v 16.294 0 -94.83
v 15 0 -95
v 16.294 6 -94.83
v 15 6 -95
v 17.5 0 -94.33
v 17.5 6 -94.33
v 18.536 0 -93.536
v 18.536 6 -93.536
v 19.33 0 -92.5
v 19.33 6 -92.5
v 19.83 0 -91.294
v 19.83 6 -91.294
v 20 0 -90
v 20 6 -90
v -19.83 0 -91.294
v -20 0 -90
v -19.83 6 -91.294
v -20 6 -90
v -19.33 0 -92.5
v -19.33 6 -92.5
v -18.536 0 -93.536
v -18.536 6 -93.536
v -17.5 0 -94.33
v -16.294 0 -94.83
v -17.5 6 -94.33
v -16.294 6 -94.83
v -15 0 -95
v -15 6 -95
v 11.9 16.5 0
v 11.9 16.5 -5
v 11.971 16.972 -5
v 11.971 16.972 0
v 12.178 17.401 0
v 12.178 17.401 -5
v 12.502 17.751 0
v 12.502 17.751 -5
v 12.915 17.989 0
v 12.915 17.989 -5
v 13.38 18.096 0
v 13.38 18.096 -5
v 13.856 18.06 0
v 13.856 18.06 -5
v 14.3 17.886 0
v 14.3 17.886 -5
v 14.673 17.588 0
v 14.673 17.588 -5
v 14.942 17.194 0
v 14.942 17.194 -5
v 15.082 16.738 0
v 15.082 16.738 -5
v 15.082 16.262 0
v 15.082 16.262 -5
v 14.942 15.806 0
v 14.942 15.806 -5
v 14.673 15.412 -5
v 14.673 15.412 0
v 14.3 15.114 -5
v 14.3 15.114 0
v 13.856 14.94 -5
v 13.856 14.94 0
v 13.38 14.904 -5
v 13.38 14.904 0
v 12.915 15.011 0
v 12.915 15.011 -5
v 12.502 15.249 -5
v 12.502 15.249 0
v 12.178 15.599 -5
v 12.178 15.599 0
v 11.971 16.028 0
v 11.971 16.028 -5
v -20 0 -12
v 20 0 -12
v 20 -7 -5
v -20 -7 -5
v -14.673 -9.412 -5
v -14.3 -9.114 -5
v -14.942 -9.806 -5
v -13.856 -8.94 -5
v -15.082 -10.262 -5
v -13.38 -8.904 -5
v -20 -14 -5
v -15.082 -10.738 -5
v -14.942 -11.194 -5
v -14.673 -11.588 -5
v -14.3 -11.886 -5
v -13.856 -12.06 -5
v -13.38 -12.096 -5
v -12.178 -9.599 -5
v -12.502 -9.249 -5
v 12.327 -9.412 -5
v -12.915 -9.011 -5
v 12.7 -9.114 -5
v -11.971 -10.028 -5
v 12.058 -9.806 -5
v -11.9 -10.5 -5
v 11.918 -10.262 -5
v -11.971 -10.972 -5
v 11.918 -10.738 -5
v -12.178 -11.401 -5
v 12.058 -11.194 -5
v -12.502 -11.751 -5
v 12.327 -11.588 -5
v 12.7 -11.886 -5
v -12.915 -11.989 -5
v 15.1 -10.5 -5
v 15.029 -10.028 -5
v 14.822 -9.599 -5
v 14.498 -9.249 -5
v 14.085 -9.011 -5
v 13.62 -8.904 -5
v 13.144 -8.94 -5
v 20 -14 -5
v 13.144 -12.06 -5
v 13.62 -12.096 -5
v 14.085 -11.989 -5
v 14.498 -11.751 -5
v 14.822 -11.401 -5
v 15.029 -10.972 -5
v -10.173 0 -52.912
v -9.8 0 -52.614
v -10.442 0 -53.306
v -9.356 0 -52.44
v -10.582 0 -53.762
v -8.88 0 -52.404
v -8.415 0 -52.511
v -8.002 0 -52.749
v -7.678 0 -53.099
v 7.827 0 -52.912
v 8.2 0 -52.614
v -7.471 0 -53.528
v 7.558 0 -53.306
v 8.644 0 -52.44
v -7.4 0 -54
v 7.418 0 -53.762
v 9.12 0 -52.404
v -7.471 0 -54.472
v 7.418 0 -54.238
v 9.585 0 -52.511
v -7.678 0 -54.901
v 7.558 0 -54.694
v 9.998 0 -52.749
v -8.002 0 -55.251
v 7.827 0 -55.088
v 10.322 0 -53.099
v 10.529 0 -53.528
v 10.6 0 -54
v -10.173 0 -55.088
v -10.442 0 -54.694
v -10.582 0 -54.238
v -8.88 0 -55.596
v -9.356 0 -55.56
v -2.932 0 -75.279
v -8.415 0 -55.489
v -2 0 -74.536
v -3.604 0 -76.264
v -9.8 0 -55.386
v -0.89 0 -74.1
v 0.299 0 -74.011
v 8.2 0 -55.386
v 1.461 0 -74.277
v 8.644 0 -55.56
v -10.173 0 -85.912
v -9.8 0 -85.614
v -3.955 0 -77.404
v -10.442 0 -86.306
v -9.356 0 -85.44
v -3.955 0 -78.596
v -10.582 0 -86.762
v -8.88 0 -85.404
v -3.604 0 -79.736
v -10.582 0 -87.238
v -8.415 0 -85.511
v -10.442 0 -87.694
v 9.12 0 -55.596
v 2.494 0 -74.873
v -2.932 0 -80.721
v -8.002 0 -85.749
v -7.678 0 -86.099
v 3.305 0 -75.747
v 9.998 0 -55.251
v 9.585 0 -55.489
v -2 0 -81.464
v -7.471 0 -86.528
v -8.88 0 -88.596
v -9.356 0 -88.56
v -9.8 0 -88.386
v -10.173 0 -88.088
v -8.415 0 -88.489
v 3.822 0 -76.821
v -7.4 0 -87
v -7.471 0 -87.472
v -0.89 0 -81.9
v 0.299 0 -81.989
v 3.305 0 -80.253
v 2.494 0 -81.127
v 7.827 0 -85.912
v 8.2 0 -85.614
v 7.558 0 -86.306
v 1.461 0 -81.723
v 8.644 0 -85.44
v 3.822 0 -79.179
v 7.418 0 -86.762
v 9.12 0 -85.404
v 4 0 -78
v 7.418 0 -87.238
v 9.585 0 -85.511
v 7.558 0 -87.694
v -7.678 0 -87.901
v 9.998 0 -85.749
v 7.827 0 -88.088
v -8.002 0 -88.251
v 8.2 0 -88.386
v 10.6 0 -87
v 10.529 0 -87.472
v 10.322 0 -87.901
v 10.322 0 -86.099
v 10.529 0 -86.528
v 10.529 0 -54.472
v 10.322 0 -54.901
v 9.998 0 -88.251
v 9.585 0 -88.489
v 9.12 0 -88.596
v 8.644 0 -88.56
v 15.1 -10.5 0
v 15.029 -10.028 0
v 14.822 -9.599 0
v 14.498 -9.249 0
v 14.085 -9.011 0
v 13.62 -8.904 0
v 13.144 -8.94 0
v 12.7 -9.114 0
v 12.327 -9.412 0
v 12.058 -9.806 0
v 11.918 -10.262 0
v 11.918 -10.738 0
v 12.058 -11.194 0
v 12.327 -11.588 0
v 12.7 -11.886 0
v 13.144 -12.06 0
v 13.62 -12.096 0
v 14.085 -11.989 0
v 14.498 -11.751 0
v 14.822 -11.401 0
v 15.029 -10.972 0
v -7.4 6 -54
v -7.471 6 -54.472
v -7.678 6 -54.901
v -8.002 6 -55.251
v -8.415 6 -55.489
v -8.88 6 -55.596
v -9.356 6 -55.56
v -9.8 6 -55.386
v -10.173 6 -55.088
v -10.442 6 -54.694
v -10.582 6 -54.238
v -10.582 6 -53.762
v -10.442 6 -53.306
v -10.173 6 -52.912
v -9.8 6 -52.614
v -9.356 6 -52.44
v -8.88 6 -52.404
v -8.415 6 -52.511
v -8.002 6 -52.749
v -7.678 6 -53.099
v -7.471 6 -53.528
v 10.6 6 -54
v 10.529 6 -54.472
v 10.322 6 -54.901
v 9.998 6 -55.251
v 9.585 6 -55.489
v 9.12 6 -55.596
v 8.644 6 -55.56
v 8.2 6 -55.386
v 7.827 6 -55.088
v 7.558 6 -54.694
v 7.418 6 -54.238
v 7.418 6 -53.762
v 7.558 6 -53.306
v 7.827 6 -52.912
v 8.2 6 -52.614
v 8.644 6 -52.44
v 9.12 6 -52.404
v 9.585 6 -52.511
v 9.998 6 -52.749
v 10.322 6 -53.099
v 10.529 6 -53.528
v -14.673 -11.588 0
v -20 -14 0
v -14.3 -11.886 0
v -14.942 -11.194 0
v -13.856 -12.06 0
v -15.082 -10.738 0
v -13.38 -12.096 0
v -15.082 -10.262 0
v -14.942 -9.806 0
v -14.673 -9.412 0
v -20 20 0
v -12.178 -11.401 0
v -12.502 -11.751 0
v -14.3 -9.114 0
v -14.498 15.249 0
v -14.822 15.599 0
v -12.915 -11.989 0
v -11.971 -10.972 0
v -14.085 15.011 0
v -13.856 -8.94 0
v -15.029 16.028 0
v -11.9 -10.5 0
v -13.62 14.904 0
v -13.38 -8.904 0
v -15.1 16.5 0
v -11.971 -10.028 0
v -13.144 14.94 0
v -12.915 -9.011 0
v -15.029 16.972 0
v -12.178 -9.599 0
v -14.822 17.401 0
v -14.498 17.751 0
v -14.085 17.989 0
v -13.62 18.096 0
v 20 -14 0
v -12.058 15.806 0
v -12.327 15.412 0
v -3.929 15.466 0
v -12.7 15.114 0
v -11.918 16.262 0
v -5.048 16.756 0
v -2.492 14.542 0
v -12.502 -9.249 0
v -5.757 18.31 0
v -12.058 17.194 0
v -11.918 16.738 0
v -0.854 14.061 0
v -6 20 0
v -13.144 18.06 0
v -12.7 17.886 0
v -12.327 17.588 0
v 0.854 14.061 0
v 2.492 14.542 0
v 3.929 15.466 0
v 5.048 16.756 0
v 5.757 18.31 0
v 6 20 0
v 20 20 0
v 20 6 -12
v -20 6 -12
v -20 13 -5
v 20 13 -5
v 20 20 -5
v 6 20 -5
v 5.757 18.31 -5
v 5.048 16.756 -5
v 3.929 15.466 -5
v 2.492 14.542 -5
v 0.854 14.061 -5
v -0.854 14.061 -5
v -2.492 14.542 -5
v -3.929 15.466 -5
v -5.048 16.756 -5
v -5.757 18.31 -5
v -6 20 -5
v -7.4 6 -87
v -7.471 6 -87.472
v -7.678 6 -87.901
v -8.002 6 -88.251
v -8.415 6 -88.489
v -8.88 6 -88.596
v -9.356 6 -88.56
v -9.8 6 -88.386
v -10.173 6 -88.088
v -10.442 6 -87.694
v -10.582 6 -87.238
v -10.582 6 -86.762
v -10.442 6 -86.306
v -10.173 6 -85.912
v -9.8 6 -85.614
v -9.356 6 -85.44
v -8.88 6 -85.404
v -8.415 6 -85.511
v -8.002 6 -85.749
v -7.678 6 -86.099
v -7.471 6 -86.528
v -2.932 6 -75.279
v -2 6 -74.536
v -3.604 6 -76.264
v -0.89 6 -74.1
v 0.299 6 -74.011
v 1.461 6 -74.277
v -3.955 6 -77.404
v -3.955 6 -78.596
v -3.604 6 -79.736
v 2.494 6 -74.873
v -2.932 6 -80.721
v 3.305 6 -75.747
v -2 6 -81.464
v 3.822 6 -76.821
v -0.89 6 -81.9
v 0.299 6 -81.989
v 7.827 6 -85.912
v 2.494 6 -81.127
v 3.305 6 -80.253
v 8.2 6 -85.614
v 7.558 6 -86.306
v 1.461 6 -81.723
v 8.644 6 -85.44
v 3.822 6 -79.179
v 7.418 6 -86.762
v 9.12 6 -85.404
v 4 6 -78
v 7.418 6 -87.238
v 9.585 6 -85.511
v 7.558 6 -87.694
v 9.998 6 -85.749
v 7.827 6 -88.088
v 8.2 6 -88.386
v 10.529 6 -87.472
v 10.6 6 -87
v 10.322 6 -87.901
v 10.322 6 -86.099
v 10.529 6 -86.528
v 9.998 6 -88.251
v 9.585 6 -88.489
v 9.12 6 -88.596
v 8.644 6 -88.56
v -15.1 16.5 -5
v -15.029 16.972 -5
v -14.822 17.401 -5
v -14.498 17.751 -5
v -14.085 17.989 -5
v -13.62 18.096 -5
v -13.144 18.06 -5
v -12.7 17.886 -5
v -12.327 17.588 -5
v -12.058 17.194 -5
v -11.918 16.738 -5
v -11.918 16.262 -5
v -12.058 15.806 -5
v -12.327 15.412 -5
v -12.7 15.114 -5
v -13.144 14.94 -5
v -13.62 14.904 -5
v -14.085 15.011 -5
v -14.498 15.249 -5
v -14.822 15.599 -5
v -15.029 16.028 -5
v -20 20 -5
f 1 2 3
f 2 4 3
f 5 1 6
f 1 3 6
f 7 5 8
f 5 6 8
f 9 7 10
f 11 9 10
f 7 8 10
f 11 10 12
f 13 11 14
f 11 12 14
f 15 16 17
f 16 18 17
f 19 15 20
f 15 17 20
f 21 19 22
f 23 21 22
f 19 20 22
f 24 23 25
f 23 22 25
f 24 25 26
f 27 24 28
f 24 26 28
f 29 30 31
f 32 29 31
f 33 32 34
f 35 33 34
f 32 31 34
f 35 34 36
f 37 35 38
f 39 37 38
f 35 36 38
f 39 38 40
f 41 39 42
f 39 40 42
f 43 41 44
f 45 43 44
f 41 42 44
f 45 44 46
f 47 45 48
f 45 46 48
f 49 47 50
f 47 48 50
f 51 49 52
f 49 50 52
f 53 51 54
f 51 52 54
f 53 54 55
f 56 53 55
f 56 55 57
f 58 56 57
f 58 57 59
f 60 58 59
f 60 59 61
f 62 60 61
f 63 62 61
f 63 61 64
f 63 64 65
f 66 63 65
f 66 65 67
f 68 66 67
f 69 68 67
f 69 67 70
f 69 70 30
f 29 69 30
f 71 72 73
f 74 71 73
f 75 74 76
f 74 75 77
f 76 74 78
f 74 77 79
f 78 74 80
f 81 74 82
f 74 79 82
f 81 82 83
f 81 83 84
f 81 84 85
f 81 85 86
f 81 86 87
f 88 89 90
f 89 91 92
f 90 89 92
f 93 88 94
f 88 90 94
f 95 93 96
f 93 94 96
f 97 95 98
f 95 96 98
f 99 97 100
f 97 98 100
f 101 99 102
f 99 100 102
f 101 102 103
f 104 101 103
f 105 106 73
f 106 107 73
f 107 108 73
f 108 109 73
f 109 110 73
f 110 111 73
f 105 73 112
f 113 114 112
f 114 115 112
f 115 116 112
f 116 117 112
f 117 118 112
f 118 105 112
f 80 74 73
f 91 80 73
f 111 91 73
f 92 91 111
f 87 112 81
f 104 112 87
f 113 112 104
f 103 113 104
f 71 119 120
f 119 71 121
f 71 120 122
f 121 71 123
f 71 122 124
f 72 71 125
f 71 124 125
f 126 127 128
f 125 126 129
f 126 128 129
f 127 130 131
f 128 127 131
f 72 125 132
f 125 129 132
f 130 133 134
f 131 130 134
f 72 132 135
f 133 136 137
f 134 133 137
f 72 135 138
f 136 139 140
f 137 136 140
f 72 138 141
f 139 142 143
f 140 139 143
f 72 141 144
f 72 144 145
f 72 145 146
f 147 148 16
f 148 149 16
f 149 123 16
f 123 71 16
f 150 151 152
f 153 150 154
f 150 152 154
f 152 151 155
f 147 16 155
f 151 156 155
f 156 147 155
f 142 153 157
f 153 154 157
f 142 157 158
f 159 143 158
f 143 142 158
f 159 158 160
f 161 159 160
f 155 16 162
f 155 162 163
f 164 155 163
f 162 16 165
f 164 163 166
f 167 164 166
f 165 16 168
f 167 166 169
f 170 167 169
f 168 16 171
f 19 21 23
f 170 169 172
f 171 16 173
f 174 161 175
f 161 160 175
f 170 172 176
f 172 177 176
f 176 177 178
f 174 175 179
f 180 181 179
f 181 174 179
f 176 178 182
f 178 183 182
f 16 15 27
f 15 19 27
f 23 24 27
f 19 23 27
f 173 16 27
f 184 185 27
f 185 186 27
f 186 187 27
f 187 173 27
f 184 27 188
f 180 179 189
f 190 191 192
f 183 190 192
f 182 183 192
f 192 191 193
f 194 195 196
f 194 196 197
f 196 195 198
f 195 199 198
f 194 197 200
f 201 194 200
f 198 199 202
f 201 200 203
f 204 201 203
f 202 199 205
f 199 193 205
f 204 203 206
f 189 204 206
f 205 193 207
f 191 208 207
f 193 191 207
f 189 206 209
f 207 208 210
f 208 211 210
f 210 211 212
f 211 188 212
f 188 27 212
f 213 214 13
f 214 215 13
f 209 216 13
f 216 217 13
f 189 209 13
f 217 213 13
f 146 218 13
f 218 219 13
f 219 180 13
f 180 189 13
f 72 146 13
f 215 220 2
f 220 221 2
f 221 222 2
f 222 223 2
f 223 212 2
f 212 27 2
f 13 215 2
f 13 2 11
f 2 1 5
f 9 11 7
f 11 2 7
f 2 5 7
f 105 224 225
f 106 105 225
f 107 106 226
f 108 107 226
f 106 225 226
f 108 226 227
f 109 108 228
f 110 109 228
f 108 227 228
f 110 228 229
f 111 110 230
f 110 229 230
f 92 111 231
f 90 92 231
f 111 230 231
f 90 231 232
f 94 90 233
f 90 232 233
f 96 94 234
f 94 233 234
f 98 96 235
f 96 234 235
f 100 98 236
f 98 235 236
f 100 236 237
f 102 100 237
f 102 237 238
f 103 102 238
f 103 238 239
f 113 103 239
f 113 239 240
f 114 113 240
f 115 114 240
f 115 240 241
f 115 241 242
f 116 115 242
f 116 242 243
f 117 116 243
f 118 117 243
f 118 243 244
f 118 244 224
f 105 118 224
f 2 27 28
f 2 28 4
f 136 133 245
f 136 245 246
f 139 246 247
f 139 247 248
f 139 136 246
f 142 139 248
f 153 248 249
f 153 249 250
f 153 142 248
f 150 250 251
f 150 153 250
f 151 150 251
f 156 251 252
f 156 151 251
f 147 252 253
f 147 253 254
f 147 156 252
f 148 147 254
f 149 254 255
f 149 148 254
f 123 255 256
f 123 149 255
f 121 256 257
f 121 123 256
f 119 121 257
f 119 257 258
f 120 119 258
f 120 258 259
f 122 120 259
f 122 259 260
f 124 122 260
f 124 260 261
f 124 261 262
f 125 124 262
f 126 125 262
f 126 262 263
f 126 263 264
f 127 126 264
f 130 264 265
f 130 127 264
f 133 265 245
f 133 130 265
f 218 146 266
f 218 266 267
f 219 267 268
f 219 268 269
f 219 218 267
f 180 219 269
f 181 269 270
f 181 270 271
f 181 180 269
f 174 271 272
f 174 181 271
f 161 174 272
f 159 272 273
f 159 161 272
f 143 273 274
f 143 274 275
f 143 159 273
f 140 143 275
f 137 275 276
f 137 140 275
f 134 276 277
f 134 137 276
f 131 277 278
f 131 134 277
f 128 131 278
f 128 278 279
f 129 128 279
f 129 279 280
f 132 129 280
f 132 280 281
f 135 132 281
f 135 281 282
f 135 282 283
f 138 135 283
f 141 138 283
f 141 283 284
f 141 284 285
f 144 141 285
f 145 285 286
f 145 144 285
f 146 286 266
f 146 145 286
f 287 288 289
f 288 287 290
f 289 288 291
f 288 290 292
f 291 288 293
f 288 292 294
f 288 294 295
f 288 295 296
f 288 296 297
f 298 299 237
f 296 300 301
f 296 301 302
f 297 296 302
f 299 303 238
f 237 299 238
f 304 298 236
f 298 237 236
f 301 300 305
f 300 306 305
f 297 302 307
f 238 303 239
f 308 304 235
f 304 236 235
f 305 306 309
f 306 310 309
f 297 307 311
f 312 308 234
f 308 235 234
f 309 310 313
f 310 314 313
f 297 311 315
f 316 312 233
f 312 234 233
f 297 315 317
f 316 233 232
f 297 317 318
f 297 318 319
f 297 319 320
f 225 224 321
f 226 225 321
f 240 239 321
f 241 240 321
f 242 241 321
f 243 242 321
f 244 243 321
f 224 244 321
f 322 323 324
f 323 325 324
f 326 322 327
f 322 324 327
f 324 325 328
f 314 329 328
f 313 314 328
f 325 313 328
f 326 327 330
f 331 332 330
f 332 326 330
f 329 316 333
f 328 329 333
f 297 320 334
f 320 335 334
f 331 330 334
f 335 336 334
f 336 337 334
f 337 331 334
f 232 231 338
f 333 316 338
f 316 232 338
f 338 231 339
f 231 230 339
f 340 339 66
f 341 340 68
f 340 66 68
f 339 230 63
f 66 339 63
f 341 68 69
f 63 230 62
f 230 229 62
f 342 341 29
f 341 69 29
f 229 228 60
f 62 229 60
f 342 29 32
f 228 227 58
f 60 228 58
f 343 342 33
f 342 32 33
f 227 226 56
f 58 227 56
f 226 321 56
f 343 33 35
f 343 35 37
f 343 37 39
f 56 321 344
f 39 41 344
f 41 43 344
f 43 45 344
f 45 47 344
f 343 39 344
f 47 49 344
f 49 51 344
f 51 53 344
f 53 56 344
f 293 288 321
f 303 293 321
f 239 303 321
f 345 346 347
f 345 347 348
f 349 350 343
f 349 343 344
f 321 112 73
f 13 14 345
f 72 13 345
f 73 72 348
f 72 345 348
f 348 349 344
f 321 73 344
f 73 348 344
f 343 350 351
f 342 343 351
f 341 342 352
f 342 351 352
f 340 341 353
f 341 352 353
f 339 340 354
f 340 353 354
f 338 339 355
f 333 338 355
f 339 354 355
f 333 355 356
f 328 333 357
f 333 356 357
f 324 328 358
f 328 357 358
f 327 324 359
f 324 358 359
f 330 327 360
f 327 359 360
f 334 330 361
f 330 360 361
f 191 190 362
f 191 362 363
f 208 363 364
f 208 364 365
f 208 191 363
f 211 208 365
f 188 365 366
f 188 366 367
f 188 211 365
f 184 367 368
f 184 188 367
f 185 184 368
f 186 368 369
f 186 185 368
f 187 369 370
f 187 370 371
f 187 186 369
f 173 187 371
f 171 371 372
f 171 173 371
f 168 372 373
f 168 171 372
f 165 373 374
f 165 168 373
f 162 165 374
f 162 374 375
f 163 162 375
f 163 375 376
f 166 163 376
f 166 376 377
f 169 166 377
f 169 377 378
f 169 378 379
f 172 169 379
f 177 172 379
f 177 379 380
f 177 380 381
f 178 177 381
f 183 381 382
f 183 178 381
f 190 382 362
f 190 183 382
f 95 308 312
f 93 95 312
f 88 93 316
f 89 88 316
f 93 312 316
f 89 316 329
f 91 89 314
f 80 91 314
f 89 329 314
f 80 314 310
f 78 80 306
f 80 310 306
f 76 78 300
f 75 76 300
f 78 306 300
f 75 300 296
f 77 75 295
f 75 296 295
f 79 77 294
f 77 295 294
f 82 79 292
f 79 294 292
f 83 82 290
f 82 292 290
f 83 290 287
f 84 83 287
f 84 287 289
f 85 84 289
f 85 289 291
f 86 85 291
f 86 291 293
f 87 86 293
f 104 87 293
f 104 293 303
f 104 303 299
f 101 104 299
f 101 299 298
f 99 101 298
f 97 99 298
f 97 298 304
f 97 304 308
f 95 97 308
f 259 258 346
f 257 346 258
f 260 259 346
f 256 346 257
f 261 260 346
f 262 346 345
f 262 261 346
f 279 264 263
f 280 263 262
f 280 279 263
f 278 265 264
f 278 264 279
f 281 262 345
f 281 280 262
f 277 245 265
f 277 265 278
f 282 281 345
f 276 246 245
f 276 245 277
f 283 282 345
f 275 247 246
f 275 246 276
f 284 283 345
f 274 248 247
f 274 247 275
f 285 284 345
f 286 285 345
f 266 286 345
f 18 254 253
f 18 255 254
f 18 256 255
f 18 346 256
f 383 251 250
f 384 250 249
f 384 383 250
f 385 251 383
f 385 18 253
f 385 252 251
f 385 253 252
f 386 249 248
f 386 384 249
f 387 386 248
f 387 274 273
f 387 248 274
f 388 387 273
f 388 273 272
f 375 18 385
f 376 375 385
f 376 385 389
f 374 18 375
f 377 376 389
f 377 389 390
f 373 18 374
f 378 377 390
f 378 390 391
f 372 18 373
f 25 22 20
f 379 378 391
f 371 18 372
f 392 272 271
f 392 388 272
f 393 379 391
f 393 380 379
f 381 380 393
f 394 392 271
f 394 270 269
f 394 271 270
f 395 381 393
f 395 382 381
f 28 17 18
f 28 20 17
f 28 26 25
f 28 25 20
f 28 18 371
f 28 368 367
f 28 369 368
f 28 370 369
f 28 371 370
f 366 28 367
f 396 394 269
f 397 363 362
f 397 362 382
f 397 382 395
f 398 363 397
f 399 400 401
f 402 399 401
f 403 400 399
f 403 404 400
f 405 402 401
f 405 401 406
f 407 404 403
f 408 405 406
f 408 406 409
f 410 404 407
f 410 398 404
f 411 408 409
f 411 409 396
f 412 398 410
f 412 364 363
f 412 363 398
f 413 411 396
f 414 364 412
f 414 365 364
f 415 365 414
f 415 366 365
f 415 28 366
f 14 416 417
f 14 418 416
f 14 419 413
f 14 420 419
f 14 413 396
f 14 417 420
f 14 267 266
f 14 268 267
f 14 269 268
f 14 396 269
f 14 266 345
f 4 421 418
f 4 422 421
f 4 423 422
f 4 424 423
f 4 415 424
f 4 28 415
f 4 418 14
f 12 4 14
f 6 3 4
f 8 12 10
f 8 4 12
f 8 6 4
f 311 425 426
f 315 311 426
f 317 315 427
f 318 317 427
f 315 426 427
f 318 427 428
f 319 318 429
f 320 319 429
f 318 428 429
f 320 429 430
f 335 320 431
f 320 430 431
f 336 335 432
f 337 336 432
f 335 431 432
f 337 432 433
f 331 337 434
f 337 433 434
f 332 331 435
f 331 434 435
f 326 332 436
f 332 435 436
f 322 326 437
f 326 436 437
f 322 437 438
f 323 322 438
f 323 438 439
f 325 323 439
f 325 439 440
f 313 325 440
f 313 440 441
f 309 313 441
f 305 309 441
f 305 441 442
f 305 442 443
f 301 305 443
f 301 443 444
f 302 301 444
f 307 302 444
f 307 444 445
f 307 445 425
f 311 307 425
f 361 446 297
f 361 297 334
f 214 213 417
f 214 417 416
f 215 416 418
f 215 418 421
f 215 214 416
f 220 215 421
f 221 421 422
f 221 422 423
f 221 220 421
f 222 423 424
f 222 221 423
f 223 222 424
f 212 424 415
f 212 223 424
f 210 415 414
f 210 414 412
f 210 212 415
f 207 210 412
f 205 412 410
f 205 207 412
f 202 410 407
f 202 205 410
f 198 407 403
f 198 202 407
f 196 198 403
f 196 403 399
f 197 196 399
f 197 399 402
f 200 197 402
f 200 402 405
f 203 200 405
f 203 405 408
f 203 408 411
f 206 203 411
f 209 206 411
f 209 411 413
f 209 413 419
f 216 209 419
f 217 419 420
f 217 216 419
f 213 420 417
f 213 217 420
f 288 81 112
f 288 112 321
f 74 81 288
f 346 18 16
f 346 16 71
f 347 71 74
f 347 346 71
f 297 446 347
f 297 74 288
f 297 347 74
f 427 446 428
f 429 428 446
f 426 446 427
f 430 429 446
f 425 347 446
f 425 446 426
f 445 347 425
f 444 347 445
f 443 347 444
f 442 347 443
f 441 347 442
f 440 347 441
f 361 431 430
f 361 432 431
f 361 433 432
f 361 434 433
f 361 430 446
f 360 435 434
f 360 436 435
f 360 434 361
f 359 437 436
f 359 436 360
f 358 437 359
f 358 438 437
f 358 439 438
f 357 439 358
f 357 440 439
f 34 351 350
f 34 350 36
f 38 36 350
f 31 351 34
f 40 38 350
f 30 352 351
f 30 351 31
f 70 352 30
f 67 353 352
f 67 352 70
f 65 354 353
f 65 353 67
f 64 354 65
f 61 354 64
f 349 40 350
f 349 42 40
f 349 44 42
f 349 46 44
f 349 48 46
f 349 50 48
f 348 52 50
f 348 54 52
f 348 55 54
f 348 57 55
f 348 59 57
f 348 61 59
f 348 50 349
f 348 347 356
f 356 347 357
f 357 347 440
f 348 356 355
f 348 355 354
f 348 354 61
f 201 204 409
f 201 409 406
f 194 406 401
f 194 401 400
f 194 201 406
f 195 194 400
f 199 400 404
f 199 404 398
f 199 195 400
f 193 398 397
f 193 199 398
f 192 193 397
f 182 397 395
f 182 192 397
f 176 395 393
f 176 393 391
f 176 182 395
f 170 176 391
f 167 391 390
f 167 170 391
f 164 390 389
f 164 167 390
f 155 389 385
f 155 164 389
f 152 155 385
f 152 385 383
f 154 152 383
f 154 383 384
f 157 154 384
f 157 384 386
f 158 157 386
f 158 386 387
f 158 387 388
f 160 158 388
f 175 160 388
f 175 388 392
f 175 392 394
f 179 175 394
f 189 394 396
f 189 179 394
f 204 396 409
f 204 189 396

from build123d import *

# Parameters (mm, degrees)
SKETCH_1_W          = 40
SKETCH_1_H          = 95
SKETCH_1_R          = 4
SKETCH_1_R_2        = 1.6
EXTRUDE_1_DEPTH     = 6
SKETCH_2_W          = 40
SKETCH_2_H          = 5
EXTRUDE_2_DEPTH     = 14
SKETCH_3_R          = 6
CUT_EXTRUDE_1_DEPTH = 14
CHAMFER_1_SIZE      = 7
SKETCH_4_R          = 1.6
CUT_EXTRUDE_2_DEPTH = 14
FILLET_1_R          = 5
EXTRUDE_3_DEPTH     = 40
SKETCH_7_R          = 1.6
CUT_EXTRUDE_3_DEPTH = 40


with BuildPart() as part:
    # Эскиз1 → Бобышка-Вытянуть1 (new body)
    with BuildSketch(Plane(origin=(0, 0, 0), x_dir=(1, 0, 0), z_dir=(0, 1, 0))):
        with Locations((0, 47.5)):
            Rectangle(SKETCH_1_W, SKETCH_1_H)
        with Locations((0, 78)):
            Circle(SKETCH_1_R, mode=Mode.SUBTRACT)
        with Locations((-9, 87)):
            Circle(SKETCH_1_R_2, mode=Mode.SUBTRACT)
        with Locations((9, 87)):
            Circle(SKETCH_1_R_2, mode=Mode.SUBTRACT)
        with Locations((-9, 54)):
            Circle(SKETCH_1_R_2, mode=Mode.SUBTRACT)
        with Locations((9, 54)):
            Circle(SKETCH_1_R_2, mode=Mode.SUBTRACT)
    extrude(amount=EXTRUDE_1_DEPTH)

    # Эскиз2 → Бобышка-Вытянуть2 (add)
    with BuildSketch(Plane(origin=(0, 6, 0), x_dir=(1, 0, 0), z_dir=(0, 1, 0))):
        with Locations((0, 2.5)):
            Rectangle(SKETCH_2_W, SKETCH_2_H)
    extrude(amount=EXTRUDE_2_DEPTH)

    # Эскиз3 → Вырез-Вытянуть1 (cut)
    with BuildSketch(Plane(origin=(0, 0, -5), x_dir=(-1, 0, 0), z_dir=(0, 0, -1))):
        with Locations((0, 20)):
            Circle(SKETCH_3_R)
    extrude(amount=-CUT_EXTRUDE_1_DEPTH, mode=Mode.SUBTRACT)

    # Фаска1
    chamfer_1_edges = [part.edges().sort_by_distance(p)[0] for p in [
        (0, 6, -5),
    ]]
    chamfer(chamfer_1_edges, length=CHAMFER_1_SIZE)

    # Эскиз4 → Вырез-Вытянуть2 (cut)
    with BuildSketch(Plane(origin=(0, 0, -5), x_dir=(-1, 0, 0), z_dir=(0, 0, -1))):
        with Locations((13.5, 16.5)):
            Circle(SKETCH_4_R)
        with Locations((-13.5, 16.5)):
            Circle(SKETCH_4_R)
    extrude(amount=-CUT_EXTRUDE_2_DEPTH, mode=Mode.SUBTRACT)

    # Скругление1
    fillet_1_edges = [part.edges().sort_by_distance(p)[0] for p in [
        (-20, 3, -95),
        (20, 3, -95),
    ]]
    fillet(fillet_1_edges, radius=FILLET_1_R)

    # Эскиз5 → Бобышка-Вытянуть3 (add)
    with BuildSketch(Plane(origin=(20, 0, 0), x_dir=(0, 0, -1), z_dir=(1, 0, 0))):
        Polygon((5, -7), (5, -14), (0, -14), (0, 0), (12, 0), align=None)
    extrude(amount=-EXTRUDE_3_DEPTH)

    # Эскиз7 → Вырез-Вытянуть3 (cut)
    with BuildSketch(Plane.XY):
        with Locations((13.5, -10.5)):
            Circle(SKETCH_7_R)
        with Locations((-13.5, -10.5)):
            Circle(SKETCH_7_R)
    extrude(amount=-CUT_EXTRUDE_3_DEPTH, mode=Mode.SUBTRACT)


solid = part.part
